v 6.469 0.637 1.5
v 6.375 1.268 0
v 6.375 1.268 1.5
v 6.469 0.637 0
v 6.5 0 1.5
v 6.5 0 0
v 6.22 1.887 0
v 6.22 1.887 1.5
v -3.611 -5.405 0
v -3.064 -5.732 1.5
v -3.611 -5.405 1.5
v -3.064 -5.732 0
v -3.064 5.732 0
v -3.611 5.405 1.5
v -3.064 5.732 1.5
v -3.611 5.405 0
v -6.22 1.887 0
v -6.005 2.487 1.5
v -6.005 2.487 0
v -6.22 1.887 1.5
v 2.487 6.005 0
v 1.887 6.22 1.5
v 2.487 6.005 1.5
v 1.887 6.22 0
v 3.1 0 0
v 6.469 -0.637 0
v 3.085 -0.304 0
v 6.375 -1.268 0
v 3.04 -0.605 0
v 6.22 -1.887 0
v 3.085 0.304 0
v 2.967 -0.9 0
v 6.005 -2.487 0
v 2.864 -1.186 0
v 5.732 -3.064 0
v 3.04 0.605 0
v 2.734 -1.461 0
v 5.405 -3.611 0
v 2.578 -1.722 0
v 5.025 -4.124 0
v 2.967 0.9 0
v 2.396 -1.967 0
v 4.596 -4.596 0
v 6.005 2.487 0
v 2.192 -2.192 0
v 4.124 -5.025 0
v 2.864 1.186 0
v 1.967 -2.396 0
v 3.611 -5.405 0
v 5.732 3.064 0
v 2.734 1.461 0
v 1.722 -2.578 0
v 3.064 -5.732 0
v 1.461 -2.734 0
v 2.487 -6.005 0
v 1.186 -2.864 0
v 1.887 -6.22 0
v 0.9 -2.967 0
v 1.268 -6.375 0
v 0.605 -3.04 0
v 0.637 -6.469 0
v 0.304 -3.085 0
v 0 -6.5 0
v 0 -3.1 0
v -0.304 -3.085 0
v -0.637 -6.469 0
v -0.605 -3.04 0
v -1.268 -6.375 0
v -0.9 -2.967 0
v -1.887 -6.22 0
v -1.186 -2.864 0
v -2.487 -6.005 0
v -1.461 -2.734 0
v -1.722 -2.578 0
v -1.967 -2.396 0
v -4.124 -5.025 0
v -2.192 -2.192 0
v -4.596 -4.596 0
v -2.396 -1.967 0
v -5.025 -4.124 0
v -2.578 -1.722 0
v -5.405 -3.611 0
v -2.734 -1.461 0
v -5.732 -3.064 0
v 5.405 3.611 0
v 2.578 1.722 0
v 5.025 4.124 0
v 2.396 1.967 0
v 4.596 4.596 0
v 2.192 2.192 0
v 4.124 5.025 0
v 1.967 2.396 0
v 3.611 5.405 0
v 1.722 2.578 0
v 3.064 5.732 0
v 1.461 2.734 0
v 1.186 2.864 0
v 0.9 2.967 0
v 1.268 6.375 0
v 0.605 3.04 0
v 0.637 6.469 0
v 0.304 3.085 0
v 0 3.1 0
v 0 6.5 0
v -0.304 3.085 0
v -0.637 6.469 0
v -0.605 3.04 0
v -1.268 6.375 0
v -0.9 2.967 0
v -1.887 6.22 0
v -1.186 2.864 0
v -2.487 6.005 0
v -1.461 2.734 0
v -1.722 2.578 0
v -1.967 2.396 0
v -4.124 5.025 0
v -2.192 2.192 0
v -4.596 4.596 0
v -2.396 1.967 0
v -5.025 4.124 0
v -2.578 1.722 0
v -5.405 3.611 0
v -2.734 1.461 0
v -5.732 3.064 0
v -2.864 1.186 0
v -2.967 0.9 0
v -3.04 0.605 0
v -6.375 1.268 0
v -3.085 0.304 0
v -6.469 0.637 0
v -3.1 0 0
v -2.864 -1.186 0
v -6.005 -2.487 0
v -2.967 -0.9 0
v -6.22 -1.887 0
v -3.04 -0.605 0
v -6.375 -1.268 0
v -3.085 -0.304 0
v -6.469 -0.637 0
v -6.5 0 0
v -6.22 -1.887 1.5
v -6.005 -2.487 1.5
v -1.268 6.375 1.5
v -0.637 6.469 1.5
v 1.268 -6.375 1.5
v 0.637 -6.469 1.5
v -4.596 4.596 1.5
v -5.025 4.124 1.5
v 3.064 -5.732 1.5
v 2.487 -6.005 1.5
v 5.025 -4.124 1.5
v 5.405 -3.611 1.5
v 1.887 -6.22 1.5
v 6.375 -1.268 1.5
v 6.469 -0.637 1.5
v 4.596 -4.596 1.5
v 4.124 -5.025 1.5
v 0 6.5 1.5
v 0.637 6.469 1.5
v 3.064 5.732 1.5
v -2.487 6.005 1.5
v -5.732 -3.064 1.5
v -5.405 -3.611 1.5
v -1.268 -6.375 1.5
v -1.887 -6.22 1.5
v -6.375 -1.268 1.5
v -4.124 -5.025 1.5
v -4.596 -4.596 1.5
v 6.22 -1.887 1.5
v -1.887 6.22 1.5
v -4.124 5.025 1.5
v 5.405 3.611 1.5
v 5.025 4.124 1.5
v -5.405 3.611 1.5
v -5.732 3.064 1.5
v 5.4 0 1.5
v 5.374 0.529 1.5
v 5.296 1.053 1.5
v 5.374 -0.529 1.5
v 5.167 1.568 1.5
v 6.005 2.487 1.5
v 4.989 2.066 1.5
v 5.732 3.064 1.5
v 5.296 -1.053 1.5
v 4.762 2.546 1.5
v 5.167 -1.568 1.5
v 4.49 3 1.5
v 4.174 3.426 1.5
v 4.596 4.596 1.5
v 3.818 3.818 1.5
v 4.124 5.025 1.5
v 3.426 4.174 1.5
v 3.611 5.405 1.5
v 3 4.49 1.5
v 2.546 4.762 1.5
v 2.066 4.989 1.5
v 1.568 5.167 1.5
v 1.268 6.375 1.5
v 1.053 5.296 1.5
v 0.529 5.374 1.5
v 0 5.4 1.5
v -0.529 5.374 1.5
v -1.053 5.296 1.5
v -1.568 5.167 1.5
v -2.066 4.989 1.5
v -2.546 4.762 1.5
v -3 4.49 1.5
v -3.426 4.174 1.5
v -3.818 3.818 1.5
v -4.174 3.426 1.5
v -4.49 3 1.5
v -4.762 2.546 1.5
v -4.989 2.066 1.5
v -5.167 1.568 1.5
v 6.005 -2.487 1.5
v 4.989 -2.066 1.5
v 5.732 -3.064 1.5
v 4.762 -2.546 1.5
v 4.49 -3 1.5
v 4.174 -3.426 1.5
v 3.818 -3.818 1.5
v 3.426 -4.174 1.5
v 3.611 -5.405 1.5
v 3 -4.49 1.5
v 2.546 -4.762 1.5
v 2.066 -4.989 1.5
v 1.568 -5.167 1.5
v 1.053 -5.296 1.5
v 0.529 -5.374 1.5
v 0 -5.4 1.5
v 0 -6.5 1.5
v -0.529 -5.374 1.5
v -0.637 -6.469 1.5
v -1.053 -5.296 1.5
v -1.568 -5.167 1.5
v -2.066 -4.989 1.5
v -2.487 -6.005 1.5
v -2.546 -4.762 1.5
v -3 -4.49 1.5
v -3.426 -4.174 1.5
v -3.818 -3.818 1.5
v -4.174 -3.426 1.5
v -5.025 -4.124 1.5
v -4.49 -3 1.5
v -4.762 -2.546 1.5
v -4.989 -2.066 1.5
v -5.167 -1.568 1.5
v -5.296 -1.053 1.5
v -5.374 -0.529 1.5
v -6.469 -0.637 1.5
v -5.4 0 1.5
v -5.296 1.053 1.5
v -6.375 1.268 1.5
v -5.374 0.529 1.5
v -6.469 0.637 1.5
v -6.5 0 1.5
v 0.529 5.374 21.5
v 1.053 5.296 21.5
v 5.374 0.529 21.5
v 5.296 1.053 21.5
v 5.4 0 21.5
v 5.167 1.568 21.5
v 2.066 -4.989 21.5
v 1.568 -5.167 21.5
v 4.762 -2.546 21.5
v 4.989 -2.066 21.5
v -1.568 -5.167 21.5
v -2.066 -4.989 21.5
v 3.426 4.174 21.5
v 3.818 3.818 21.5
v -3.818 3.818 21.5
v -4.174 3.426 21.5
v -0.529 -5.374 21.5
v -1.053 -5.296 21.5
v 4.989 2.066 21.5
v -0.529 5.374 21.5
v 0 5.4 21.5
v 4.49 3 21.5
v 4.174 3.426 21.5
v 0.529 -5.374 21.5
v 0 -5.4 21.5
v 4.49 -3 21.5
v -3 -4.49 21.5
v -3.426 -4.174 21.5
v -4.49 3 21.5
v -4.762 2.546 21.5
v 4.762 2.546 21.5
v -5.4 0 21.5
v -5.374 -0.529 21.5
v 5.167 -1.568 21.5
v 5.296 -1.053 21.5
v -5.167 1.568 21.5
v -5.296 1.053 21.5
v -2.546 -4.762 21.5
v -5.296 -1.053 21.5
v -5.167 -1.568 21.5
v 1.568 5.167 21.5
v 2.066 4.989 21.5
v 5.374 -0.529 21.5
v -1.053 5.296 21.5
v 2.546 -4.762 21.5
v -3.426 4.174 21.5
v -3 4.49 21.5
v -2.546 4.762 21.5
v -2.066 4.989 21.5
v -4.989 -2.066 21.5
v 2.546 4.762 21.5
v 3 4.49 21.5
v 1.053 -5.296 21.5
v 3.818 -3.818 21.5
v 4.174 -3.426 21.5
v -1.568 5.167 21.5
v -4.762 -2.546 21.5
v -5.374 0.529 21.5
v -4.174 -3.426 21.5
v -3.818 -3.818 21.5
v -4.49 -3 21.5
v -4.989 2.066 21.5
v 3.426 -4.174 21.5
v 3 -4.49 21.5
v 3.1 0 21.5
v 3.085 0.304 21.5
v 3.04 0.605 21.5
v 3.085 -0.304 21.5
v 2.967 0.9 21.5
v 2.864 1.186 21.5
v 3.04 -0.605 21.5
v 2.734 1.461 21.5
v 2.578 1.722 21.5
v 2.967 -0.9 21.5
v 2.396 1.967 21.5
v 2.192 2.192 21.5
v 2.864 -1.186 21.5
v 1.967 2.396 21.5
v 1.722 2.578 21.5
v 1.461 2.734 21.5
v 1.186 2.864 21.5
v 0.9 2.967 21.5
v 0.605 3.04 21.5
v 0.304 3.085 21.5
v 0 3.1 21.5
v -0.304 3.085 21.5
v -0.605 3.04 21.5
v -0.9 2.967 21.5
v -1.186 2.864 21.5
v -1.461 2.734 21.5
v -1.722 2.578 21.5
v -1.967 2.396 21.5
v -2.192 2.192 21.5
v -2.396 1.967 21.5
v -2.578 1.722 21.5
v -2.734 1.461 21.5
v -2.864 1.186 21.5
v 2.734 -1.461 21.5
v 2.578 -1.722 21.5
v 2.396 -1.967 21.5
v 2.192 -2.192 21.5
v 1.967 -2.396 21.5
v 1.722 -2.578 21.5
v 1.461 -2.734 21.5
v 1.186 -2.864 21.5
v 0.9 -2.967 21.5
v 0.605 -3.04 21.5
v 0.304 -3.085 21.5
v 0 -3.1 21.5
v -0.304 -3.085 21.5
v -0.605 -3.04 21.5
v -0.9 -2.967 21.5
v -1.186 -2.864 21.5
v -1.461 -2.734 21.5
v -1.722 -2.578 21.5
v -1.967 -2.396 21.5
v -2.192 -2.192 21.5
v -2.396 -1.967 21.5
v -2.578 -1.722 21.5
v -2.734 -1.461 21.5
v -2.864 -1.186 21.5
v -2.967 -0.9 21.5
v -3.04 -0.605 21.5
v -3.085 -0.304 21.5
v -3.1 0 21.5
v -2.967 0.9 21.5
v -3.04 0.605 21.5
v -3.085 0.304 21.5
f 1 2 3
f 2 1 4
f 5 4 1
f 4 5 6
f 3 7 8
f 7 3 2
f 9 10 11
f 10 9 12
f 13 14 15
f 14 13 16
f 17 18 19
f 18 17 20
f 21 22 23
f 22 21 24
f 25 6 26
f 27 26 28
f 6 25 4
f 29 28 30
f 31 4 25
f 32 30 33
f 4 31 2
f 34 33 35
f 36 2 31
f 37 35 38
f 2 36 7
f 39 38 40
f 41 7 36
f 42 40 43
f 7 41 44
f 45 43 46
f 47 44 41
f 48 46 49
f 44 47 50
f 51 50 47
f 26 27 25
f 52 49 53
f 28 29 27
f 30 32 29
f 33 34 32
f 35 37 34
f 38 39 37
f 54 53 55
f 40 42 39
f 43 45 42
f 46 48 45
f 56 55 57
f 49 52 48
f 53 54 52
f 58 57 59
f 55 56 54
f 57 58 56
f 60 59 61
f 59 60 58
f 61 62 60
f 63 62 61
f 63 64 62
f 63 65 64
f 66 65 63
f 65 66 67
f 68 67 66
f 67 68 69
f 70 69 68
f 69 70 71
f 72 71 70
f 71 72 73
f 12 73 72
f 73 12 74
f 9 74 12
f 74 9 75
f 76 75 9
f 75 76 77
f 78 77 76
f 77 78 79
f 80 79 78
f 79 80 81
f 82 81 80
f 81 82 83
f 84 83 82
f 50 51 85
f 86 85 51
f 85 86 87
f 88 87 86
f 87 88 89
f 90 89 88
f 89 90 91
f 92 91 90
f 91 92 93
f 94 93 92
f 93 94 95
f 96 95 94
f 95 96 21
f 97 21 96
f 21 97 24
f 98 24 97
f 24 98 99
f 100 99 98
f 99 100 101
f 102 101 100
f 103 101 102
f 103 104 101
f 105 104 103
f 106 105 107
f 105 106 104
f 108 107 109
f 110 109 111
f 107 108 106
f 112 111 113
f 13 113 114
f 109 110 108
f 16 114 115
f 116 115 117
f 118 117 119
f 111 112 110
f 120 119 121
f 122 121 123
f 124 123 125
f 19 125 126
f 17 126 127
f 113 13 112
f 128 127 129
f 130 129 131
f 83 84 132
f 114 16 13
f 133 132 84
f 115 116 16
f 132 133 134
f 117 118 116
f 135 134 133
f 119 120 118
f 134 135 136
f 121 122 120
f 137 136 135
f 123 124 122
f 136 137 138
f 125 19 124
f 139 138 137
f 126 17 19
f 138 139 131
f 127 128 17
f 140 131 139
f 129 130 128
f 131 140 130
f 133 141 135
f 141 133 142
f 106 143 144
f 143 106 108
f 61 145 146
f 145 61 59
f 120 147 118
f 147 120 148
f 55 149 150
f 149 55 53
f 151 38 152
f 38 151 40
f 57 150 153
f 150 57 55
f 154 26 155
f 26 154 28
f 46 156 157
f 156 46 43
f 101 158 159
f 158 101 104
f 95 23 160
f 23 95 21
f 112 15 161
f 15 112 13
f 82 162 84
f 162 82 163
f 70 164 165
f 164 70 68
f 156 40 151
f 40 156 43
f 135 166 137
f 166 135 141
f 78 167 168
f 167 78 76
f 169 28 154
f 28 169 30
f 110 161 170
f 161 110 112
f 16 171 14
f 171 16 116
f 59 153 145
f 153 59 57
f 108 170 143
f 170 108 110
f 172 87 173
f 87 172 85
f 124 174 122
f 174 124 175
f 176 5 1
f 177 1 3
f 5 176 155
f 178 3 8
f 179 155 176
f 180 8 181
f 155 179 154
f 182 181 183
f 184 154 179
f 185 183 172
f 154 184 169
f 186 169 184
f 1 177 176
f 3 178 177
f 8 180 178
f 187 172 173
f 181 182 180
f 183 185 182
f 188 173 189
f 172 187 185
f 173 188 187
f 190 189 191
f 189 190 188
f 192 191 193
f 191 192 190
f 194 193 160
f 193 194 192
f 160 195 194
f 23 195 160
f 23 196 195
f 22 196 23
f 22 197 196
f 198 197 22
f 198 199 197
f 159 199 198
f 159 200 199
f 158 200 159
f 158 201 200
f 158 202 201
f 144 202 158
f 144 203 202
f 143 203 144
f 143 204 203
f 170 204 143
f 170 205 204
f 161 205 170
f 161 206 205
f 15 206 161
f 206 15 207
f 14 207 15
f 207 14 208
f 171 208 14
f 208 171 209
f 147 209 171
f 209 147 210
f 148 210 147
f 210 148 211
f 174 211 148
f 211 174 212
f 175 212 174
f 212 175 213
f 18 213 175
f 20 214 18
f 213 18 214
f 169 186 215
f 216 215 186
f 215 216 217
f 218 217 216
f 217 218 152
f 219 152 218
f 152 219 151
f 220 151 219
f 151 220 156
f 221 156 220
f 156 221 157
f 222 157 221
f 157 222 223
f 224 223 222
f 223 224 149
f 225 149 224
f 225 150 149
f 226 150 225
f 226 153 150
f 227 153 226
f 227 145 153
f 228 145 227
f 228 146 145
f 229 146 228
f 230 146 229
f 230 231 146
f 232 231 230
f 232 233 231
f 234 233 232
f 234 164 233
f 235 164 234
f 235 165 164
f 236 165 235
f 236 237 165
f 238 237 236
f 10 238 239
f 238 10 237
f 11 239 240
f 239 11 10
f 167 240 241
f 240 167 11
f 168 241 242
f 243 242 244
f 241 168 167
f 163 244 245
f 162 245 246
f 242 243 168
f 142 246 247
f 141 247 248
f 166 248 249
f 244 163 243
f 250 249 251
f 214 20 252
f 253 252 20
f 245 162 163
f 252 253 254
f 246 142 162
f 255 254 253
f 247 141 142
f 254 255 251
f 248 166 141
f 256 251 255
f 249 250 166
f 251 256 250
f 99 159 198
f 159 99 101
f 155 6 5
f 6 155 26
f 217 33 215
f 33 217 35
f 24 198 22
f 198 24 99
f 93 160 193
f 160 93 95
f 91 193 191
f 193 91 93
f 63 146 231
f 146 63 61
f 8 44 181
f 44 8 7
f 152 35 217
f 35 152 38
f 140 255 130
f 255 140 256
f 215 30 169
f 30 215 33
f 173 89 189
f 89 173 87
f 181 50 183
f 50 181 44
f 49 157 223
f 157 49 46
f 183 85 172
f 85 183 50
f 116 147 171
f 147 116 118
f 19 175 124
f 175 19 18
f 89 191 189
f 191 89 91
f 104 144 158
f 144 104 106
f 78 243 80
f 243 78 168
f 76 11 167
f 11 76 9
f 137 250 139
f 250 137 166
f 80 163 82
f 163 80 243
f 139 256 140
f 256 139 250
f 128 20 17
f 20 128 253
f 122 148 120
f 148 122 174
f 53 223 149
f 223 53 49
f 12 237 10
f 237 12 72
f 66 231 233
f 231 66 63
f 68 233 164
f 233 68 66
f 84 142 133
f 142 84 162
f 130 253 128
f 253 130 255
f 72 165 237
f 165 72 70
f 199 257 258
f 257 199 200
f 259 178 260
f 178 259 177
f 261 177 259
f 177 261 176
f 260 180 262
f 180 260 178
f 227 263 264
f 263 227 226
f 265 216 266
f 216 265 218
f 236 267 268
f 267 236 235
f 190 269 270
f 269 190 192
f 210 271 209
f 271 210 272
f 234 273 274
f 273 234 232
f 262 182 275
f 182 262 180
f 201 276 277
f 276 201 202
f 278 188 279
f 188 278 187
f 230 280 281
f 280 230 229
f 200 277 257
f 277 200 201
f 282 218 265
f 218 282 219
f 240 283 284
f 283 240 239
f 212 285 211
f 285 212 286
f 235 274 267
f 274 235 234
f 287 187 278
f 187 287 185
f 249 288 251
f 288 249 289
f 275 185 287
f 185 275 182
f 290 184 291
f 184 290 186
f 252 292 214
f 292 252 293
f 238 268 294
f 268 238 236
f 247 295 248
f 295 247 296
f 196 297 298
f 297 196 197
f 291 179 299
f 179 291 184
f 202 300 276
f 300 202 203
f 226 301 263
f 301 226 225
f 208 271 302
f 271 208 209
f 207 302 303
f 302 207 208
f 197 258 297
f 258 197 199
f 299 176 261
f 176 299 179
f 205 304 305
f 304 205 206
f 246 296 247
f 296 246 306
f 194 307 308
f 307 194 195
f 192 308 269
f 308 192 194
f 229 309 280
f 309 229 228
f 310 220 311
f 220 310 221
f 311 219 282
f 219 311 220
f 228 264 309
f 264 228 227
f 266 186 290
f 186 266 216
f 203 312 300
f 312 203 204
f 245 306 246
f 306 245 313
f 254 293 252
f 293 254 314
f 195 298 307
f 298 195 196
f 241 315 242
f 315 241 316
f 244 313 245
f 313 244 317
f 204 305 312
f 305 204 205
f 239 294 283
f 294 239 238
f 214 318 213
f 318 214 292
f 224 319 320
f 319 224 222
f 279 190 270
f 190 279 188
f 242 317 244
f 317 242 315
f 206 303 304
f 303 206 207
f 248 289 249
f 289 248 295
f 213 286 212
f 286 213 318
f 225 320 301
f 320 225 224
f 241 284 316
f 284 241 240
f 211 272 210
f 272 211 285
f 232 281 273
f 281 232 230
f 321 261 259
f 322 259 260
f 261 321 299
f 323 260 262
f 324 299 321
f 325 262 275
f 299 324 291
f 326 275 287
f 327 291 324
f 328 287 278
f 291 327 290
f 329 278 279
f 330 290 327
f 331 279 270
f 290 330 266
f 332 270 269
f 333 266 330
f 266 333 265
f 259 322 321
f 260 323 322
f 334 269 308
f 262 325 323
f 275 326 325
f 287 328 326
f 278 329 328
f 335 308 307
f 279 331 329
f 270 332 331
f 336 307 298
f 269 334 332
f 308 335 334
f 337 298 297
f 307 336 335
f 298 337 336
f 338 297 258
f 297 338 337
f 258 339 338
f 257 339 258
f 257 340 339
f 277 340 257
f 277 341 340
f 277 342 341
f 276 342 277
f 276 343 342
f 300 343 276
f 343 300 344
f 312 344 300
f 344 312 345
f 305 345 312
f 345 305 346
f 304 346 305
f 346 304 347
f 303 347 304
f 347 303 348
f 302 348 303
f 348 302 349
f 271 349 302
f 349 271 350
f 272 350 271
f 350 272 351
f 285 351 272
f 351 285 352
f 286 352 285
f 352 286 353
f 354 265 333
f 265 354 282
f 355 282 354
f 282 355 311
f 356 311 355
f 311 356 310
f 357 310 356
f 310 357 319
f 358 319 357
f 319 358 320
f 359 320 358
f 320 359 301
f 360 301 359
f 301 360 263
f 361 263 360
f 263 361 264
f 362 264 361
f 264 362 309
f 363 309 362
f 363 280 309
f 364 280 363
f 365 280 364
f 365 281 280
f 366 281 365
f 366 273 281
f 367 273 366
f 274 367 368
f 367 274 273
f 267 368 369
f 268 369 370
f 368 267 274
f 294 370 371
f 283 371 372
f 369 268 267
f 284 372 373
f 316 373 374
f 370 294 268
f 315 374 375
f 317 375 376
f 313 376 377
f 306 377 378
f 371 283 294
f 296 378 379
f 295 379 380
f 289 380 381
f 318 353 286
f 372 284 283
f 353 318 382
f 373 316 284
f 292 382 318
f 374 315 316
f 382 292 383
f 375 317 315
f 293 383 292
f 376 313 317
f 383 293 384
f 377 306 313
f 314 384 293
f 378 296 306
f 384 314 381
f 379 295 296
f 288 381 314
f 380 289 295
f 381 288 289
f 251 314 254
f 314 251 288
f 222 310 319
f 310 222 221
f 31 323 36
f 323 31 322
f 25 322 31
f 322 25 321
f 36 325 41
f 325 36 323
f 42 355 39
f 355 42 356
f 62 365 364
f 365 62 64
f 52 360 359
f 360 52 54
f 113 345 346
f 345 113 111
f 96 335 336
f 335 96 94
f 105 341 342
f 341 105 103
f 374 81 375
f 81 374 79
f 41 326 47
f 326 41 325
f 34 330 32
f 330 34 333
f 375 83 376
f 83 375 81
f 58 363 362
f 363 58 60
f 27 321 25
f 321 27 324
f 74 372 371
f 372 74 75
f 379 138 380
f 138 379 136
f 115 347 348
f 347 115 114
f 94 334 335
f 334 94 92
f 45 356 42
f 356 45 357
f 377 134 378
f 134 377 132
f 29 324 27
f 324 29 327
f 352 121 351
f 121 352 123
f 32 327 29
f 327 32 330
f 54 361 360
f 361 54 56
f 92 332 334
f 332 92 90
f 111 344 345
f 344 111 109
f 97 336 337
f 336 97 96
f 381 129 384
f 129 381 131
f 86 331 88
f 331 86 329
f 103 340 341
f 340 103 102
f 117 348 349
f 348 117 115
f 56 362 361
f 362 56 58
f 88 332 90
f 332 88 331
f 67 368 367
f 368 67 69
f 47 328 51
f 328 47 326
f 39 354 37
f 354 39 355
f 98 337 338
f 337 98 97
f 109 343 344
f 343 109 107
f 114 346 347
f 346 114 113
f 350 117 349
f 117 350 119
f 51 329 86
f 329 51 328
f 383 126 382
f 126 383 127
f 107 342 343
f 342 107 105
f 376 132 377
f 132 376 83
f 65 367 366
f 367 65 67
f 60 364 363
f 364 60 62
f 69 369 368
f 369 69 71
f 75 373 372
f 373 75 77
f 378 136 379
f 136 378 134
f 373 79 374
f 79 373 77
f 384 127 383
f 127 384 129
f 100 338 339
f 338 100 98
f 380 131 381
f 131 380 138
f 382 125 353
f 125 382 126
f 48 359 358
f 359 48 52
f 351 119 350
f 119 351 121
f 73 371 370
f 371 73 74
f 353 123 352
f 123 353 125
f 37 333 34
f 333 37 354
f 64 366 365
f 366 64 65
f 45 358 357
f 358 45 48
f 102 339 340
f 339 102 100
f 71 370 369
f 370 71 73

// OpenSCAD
// PCR tube adapter sleeve for 1.5 mL rack holes
// Print orientation: collar on bed (z = 0), sleeve body rises to z = 21.5

$fn = 64;

// --- Dimensions (mm) ---
collar_d      = 13;    // collar outer diameter
collar_h      = 1.5;   // collar thickness
sleeve_od     = 10.8;  // sleeve body outer diameter
sleeve_h      = 20;    // sleeve body height (z = 1.5 to 21.5)
bore_d        = 6.2;   // through-bore diameter
eps           = 0.5;   // cutter overshoot past faces

total_h = collar_h + sleeve_h; // 21.5 mm overall height

difference() {
    union() {
        // Collar
        cylinder(d = collar_d, h = collar_h);
        // Sleeve body (slightly overlapping the collar for a clean union)
        translate([0, 0, collar_h - 0.01])
            cylinder(d = sleeve_od, h = sleeve_h + 0.01);
    }
    // Straight through-bore
    translate([0, 0, -eps])
        cylinder(d = bore_d, h = total_h + 2 * eps);
}
